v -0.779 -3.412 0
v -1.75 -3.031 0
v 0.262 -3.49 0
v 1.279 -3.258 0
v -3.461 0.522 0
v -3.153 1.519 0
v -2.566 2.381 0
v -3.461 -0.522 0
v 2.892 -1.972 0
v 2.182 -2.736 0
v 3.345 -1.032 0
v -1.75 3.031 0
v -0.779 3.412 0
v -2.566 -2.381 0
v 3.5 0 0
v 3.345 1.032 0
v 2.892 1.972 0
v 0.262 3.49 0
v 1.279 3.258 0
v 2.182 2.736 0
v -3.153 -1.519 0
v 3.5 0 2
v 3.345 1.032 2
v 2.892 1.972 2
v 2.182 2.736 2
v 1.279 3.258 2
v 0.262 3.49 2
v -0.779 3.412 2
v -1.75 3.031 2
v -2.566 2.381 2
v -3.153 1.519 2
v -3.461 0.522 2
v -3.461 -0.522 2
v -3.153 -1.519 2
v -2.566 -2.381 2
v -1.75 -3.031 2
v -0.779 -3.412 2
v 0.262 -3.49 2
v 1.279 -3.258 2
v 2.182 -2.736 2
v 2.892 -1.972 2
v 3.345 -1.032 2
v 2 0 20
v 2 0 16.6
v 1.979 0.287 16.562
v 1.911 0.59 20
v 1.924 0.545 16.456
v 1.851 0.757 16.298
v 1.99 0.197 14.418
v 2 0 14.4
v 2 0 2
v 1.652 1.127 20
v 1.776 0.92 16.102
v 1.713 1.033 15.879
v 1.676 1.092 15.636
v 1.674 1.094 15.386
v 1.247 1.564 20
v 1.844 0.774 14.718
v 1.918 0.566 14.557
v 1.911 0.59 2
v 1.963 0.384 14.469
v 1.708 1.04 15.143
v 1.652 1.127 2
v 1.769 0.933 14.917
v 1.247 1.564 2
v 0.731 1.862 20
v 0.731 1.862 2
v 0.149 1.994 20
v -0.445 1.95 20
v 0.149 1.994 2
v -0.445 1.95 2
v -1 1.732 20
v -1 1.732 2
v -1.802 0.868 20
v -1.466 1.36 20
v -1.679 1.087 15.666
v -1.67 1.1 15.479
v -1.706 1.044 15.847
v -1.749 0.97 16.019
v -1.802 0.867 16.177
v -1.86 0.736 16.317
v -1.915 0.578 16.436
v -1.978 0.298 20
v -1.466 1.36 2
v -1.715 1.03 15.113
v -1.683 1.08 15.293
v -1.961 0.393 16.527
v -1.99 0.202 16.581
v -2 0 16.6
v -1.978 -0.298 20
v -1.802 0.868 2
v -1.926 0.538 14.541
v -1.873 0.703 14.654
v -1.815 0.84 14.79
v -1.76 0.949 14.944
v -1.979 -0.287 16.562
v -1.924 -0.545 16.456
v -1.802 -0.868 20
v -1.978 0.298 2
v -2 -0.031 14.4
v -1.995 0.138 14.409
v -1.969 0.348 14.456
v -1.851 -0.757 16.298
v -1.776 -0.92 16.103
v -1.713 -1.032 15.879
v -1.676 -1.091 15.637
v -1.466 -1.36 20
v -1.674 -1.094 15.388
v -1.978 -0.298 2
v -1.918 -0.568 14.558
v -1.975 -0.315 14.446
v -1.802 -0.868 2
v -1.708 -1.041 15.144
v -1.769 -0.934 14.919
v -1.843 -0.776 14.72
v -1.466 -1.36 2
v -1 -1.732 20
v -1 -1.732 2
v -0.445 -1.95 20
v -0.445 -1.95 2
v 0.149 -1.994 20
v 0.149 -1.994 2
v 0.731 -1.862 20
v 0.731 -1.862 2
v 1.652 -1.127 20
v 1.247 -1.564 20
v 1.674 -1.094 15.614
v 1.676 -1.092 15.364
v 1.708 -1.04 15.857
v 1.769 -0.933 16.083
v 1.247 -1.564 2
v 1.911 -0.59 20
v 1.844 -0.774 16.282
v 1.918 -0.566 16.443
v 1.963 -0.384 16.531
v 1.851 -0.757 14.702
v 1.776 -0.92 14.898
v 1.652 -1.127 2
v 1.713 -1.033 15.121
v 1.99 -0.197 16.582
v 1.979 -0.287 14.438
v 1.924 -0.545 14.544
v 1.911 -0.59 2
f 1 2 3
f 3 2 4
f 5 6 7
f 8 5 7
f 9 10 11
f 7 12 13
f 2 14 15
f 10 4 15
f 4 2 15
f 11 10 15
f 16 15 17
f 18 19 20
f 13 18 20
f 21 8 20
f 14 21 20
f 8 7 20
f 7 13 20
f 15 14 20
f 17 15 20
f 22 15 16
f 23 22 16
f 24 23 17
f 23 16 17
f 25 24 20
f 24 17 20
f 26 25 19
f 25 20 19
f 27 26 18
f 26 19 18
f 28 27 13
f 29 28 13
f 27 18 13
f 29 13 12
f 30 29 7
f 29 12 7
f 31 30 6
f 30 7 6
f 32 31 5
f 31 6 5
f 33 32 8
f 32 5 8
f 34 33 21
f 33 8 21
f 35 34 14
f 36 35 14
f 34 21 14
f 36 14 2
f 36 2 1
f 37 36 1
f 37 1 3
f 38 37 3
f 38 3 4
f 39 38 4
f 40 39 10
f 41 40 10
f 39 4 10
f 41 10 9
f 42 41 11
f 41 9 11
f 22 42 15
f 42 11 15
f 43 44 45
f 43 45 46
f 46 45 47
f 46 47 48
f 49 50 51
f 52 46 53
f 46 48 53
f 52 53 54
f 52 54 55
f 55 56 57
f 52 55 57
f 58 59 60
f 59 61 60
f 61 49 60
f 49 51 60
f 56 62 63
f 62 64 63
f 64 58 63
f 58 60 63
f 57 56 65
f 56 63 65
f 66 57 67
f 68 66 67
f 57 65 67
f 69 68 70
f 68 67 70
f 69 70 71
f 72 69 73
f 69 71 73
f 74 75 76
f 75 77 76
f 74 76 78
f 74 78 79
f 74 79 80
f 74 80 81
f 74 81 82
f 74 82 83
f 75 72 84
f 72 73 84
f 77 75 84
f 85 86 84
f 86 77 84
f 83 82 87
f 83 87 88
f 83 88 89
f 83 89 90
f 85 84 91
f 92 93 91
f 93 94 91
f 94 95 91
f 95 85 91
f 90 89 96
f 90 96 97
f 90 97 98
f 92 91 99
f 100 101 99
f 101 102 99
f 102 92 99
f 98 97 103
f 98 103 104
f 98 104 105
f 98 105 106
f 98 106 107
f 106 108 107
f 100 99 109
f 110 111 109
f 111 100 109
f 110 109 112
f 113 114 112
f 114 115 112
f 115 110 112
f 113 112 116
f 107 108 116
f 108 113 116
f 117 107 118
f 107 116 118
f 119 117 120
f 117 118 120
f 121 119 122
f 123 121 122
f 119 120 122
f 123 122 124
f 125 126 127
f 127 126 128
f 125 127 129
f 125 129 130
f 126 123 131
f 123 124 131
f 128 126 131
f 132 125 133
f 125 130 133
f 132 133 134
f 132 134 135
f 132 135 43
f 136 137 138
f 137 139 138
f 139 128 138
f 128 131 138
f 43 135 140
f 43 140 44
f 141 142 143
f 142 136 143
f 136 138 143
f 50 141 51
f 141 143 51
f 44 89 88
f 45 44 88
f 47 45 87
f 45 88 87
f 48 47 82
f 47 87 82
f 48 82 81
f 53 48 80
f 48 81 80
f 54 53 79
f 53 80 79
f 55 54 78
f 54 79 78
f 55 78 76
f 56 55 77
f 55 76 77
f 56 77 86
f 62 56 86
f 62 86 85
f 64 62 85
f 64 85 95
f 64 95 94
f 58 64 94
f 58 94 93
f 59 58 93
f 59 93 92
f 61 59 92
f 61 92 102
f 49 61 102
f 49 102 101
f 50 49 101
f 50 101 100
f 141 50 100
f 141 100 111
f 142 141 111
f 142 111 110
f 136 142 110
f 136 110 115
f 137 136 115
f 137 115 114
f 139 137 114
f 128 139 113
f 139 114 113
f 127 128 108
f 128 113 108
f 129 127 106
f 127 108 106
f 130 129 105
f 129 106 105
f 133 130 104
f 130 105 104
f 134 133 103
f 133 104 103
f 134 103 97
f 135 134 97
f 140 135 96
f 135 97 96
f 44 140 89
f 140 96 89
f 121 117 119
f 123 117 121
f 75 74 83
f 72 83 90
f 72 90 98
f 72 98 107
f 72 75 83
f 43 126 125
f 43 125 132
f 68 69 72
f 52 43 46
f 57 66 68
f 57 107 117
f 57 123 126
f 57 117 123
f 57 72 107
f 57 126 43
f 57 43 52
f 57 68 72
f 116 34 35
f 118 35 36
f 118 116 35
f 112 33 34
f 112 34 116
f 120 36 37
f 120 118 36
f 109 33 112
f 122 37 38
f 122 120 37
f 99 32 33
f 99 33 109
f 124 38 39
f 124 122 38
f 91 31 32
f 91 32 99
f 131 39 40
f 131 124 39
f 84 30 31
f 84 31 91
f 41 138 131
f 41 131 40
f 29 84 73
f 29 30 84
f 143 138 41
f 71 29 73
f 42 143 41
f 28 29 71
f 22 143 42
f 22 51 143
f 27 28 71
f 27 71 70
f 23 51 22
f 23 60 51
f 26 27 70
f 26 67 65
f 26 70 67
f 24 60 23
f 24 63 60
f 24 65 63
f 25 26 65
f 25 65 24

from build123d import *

# Parameters (mm, degrees)
SZKIC1_R                    = 3.5
DODANIE_WYCI_GNI_CIE1_DEPTH = 2
SZKIC2_R                    = 2
DODANIE_WYCI_GNI_CIE2_DEPTH = 18
SZKIC3_R                    = 1.1
WYTNIJ_WYCI_GNI_CIE1_DEPTH  = 6.5


with BuildPart() as part:
    # Szkic1 → Dodanie-wyciągnięcie1 (new body)
    with BuildSketch(Plane.XY):
        Circle(SZKIC1_R)
    extrude(amount=DODANIE_WYCI_GNI_CIE1_DEPTH)

    # Szkic2 → Dodanie-wyciągnięcie2 (add)
    with BuildSketch(Plane.XY.offset(2)):
        Circle(SZKIC2_R)
    extrude(amount=DODANIE_WYCI_GNI_CIE2_DEPTH)

    # Szkic3 → Wytnij-wyciągnięcie1 (cut, through all)
    with BuildSketch(Plane.ZY.offset(2)):
        with Locations((15.5, 0)):
            Circle(SZKIC3_R)
    extrude(amount=-WYTNIJ_WYCI_GNI_CIE1_DEPTH, mode=Mode.SUBTRACT)


solid = part.part
